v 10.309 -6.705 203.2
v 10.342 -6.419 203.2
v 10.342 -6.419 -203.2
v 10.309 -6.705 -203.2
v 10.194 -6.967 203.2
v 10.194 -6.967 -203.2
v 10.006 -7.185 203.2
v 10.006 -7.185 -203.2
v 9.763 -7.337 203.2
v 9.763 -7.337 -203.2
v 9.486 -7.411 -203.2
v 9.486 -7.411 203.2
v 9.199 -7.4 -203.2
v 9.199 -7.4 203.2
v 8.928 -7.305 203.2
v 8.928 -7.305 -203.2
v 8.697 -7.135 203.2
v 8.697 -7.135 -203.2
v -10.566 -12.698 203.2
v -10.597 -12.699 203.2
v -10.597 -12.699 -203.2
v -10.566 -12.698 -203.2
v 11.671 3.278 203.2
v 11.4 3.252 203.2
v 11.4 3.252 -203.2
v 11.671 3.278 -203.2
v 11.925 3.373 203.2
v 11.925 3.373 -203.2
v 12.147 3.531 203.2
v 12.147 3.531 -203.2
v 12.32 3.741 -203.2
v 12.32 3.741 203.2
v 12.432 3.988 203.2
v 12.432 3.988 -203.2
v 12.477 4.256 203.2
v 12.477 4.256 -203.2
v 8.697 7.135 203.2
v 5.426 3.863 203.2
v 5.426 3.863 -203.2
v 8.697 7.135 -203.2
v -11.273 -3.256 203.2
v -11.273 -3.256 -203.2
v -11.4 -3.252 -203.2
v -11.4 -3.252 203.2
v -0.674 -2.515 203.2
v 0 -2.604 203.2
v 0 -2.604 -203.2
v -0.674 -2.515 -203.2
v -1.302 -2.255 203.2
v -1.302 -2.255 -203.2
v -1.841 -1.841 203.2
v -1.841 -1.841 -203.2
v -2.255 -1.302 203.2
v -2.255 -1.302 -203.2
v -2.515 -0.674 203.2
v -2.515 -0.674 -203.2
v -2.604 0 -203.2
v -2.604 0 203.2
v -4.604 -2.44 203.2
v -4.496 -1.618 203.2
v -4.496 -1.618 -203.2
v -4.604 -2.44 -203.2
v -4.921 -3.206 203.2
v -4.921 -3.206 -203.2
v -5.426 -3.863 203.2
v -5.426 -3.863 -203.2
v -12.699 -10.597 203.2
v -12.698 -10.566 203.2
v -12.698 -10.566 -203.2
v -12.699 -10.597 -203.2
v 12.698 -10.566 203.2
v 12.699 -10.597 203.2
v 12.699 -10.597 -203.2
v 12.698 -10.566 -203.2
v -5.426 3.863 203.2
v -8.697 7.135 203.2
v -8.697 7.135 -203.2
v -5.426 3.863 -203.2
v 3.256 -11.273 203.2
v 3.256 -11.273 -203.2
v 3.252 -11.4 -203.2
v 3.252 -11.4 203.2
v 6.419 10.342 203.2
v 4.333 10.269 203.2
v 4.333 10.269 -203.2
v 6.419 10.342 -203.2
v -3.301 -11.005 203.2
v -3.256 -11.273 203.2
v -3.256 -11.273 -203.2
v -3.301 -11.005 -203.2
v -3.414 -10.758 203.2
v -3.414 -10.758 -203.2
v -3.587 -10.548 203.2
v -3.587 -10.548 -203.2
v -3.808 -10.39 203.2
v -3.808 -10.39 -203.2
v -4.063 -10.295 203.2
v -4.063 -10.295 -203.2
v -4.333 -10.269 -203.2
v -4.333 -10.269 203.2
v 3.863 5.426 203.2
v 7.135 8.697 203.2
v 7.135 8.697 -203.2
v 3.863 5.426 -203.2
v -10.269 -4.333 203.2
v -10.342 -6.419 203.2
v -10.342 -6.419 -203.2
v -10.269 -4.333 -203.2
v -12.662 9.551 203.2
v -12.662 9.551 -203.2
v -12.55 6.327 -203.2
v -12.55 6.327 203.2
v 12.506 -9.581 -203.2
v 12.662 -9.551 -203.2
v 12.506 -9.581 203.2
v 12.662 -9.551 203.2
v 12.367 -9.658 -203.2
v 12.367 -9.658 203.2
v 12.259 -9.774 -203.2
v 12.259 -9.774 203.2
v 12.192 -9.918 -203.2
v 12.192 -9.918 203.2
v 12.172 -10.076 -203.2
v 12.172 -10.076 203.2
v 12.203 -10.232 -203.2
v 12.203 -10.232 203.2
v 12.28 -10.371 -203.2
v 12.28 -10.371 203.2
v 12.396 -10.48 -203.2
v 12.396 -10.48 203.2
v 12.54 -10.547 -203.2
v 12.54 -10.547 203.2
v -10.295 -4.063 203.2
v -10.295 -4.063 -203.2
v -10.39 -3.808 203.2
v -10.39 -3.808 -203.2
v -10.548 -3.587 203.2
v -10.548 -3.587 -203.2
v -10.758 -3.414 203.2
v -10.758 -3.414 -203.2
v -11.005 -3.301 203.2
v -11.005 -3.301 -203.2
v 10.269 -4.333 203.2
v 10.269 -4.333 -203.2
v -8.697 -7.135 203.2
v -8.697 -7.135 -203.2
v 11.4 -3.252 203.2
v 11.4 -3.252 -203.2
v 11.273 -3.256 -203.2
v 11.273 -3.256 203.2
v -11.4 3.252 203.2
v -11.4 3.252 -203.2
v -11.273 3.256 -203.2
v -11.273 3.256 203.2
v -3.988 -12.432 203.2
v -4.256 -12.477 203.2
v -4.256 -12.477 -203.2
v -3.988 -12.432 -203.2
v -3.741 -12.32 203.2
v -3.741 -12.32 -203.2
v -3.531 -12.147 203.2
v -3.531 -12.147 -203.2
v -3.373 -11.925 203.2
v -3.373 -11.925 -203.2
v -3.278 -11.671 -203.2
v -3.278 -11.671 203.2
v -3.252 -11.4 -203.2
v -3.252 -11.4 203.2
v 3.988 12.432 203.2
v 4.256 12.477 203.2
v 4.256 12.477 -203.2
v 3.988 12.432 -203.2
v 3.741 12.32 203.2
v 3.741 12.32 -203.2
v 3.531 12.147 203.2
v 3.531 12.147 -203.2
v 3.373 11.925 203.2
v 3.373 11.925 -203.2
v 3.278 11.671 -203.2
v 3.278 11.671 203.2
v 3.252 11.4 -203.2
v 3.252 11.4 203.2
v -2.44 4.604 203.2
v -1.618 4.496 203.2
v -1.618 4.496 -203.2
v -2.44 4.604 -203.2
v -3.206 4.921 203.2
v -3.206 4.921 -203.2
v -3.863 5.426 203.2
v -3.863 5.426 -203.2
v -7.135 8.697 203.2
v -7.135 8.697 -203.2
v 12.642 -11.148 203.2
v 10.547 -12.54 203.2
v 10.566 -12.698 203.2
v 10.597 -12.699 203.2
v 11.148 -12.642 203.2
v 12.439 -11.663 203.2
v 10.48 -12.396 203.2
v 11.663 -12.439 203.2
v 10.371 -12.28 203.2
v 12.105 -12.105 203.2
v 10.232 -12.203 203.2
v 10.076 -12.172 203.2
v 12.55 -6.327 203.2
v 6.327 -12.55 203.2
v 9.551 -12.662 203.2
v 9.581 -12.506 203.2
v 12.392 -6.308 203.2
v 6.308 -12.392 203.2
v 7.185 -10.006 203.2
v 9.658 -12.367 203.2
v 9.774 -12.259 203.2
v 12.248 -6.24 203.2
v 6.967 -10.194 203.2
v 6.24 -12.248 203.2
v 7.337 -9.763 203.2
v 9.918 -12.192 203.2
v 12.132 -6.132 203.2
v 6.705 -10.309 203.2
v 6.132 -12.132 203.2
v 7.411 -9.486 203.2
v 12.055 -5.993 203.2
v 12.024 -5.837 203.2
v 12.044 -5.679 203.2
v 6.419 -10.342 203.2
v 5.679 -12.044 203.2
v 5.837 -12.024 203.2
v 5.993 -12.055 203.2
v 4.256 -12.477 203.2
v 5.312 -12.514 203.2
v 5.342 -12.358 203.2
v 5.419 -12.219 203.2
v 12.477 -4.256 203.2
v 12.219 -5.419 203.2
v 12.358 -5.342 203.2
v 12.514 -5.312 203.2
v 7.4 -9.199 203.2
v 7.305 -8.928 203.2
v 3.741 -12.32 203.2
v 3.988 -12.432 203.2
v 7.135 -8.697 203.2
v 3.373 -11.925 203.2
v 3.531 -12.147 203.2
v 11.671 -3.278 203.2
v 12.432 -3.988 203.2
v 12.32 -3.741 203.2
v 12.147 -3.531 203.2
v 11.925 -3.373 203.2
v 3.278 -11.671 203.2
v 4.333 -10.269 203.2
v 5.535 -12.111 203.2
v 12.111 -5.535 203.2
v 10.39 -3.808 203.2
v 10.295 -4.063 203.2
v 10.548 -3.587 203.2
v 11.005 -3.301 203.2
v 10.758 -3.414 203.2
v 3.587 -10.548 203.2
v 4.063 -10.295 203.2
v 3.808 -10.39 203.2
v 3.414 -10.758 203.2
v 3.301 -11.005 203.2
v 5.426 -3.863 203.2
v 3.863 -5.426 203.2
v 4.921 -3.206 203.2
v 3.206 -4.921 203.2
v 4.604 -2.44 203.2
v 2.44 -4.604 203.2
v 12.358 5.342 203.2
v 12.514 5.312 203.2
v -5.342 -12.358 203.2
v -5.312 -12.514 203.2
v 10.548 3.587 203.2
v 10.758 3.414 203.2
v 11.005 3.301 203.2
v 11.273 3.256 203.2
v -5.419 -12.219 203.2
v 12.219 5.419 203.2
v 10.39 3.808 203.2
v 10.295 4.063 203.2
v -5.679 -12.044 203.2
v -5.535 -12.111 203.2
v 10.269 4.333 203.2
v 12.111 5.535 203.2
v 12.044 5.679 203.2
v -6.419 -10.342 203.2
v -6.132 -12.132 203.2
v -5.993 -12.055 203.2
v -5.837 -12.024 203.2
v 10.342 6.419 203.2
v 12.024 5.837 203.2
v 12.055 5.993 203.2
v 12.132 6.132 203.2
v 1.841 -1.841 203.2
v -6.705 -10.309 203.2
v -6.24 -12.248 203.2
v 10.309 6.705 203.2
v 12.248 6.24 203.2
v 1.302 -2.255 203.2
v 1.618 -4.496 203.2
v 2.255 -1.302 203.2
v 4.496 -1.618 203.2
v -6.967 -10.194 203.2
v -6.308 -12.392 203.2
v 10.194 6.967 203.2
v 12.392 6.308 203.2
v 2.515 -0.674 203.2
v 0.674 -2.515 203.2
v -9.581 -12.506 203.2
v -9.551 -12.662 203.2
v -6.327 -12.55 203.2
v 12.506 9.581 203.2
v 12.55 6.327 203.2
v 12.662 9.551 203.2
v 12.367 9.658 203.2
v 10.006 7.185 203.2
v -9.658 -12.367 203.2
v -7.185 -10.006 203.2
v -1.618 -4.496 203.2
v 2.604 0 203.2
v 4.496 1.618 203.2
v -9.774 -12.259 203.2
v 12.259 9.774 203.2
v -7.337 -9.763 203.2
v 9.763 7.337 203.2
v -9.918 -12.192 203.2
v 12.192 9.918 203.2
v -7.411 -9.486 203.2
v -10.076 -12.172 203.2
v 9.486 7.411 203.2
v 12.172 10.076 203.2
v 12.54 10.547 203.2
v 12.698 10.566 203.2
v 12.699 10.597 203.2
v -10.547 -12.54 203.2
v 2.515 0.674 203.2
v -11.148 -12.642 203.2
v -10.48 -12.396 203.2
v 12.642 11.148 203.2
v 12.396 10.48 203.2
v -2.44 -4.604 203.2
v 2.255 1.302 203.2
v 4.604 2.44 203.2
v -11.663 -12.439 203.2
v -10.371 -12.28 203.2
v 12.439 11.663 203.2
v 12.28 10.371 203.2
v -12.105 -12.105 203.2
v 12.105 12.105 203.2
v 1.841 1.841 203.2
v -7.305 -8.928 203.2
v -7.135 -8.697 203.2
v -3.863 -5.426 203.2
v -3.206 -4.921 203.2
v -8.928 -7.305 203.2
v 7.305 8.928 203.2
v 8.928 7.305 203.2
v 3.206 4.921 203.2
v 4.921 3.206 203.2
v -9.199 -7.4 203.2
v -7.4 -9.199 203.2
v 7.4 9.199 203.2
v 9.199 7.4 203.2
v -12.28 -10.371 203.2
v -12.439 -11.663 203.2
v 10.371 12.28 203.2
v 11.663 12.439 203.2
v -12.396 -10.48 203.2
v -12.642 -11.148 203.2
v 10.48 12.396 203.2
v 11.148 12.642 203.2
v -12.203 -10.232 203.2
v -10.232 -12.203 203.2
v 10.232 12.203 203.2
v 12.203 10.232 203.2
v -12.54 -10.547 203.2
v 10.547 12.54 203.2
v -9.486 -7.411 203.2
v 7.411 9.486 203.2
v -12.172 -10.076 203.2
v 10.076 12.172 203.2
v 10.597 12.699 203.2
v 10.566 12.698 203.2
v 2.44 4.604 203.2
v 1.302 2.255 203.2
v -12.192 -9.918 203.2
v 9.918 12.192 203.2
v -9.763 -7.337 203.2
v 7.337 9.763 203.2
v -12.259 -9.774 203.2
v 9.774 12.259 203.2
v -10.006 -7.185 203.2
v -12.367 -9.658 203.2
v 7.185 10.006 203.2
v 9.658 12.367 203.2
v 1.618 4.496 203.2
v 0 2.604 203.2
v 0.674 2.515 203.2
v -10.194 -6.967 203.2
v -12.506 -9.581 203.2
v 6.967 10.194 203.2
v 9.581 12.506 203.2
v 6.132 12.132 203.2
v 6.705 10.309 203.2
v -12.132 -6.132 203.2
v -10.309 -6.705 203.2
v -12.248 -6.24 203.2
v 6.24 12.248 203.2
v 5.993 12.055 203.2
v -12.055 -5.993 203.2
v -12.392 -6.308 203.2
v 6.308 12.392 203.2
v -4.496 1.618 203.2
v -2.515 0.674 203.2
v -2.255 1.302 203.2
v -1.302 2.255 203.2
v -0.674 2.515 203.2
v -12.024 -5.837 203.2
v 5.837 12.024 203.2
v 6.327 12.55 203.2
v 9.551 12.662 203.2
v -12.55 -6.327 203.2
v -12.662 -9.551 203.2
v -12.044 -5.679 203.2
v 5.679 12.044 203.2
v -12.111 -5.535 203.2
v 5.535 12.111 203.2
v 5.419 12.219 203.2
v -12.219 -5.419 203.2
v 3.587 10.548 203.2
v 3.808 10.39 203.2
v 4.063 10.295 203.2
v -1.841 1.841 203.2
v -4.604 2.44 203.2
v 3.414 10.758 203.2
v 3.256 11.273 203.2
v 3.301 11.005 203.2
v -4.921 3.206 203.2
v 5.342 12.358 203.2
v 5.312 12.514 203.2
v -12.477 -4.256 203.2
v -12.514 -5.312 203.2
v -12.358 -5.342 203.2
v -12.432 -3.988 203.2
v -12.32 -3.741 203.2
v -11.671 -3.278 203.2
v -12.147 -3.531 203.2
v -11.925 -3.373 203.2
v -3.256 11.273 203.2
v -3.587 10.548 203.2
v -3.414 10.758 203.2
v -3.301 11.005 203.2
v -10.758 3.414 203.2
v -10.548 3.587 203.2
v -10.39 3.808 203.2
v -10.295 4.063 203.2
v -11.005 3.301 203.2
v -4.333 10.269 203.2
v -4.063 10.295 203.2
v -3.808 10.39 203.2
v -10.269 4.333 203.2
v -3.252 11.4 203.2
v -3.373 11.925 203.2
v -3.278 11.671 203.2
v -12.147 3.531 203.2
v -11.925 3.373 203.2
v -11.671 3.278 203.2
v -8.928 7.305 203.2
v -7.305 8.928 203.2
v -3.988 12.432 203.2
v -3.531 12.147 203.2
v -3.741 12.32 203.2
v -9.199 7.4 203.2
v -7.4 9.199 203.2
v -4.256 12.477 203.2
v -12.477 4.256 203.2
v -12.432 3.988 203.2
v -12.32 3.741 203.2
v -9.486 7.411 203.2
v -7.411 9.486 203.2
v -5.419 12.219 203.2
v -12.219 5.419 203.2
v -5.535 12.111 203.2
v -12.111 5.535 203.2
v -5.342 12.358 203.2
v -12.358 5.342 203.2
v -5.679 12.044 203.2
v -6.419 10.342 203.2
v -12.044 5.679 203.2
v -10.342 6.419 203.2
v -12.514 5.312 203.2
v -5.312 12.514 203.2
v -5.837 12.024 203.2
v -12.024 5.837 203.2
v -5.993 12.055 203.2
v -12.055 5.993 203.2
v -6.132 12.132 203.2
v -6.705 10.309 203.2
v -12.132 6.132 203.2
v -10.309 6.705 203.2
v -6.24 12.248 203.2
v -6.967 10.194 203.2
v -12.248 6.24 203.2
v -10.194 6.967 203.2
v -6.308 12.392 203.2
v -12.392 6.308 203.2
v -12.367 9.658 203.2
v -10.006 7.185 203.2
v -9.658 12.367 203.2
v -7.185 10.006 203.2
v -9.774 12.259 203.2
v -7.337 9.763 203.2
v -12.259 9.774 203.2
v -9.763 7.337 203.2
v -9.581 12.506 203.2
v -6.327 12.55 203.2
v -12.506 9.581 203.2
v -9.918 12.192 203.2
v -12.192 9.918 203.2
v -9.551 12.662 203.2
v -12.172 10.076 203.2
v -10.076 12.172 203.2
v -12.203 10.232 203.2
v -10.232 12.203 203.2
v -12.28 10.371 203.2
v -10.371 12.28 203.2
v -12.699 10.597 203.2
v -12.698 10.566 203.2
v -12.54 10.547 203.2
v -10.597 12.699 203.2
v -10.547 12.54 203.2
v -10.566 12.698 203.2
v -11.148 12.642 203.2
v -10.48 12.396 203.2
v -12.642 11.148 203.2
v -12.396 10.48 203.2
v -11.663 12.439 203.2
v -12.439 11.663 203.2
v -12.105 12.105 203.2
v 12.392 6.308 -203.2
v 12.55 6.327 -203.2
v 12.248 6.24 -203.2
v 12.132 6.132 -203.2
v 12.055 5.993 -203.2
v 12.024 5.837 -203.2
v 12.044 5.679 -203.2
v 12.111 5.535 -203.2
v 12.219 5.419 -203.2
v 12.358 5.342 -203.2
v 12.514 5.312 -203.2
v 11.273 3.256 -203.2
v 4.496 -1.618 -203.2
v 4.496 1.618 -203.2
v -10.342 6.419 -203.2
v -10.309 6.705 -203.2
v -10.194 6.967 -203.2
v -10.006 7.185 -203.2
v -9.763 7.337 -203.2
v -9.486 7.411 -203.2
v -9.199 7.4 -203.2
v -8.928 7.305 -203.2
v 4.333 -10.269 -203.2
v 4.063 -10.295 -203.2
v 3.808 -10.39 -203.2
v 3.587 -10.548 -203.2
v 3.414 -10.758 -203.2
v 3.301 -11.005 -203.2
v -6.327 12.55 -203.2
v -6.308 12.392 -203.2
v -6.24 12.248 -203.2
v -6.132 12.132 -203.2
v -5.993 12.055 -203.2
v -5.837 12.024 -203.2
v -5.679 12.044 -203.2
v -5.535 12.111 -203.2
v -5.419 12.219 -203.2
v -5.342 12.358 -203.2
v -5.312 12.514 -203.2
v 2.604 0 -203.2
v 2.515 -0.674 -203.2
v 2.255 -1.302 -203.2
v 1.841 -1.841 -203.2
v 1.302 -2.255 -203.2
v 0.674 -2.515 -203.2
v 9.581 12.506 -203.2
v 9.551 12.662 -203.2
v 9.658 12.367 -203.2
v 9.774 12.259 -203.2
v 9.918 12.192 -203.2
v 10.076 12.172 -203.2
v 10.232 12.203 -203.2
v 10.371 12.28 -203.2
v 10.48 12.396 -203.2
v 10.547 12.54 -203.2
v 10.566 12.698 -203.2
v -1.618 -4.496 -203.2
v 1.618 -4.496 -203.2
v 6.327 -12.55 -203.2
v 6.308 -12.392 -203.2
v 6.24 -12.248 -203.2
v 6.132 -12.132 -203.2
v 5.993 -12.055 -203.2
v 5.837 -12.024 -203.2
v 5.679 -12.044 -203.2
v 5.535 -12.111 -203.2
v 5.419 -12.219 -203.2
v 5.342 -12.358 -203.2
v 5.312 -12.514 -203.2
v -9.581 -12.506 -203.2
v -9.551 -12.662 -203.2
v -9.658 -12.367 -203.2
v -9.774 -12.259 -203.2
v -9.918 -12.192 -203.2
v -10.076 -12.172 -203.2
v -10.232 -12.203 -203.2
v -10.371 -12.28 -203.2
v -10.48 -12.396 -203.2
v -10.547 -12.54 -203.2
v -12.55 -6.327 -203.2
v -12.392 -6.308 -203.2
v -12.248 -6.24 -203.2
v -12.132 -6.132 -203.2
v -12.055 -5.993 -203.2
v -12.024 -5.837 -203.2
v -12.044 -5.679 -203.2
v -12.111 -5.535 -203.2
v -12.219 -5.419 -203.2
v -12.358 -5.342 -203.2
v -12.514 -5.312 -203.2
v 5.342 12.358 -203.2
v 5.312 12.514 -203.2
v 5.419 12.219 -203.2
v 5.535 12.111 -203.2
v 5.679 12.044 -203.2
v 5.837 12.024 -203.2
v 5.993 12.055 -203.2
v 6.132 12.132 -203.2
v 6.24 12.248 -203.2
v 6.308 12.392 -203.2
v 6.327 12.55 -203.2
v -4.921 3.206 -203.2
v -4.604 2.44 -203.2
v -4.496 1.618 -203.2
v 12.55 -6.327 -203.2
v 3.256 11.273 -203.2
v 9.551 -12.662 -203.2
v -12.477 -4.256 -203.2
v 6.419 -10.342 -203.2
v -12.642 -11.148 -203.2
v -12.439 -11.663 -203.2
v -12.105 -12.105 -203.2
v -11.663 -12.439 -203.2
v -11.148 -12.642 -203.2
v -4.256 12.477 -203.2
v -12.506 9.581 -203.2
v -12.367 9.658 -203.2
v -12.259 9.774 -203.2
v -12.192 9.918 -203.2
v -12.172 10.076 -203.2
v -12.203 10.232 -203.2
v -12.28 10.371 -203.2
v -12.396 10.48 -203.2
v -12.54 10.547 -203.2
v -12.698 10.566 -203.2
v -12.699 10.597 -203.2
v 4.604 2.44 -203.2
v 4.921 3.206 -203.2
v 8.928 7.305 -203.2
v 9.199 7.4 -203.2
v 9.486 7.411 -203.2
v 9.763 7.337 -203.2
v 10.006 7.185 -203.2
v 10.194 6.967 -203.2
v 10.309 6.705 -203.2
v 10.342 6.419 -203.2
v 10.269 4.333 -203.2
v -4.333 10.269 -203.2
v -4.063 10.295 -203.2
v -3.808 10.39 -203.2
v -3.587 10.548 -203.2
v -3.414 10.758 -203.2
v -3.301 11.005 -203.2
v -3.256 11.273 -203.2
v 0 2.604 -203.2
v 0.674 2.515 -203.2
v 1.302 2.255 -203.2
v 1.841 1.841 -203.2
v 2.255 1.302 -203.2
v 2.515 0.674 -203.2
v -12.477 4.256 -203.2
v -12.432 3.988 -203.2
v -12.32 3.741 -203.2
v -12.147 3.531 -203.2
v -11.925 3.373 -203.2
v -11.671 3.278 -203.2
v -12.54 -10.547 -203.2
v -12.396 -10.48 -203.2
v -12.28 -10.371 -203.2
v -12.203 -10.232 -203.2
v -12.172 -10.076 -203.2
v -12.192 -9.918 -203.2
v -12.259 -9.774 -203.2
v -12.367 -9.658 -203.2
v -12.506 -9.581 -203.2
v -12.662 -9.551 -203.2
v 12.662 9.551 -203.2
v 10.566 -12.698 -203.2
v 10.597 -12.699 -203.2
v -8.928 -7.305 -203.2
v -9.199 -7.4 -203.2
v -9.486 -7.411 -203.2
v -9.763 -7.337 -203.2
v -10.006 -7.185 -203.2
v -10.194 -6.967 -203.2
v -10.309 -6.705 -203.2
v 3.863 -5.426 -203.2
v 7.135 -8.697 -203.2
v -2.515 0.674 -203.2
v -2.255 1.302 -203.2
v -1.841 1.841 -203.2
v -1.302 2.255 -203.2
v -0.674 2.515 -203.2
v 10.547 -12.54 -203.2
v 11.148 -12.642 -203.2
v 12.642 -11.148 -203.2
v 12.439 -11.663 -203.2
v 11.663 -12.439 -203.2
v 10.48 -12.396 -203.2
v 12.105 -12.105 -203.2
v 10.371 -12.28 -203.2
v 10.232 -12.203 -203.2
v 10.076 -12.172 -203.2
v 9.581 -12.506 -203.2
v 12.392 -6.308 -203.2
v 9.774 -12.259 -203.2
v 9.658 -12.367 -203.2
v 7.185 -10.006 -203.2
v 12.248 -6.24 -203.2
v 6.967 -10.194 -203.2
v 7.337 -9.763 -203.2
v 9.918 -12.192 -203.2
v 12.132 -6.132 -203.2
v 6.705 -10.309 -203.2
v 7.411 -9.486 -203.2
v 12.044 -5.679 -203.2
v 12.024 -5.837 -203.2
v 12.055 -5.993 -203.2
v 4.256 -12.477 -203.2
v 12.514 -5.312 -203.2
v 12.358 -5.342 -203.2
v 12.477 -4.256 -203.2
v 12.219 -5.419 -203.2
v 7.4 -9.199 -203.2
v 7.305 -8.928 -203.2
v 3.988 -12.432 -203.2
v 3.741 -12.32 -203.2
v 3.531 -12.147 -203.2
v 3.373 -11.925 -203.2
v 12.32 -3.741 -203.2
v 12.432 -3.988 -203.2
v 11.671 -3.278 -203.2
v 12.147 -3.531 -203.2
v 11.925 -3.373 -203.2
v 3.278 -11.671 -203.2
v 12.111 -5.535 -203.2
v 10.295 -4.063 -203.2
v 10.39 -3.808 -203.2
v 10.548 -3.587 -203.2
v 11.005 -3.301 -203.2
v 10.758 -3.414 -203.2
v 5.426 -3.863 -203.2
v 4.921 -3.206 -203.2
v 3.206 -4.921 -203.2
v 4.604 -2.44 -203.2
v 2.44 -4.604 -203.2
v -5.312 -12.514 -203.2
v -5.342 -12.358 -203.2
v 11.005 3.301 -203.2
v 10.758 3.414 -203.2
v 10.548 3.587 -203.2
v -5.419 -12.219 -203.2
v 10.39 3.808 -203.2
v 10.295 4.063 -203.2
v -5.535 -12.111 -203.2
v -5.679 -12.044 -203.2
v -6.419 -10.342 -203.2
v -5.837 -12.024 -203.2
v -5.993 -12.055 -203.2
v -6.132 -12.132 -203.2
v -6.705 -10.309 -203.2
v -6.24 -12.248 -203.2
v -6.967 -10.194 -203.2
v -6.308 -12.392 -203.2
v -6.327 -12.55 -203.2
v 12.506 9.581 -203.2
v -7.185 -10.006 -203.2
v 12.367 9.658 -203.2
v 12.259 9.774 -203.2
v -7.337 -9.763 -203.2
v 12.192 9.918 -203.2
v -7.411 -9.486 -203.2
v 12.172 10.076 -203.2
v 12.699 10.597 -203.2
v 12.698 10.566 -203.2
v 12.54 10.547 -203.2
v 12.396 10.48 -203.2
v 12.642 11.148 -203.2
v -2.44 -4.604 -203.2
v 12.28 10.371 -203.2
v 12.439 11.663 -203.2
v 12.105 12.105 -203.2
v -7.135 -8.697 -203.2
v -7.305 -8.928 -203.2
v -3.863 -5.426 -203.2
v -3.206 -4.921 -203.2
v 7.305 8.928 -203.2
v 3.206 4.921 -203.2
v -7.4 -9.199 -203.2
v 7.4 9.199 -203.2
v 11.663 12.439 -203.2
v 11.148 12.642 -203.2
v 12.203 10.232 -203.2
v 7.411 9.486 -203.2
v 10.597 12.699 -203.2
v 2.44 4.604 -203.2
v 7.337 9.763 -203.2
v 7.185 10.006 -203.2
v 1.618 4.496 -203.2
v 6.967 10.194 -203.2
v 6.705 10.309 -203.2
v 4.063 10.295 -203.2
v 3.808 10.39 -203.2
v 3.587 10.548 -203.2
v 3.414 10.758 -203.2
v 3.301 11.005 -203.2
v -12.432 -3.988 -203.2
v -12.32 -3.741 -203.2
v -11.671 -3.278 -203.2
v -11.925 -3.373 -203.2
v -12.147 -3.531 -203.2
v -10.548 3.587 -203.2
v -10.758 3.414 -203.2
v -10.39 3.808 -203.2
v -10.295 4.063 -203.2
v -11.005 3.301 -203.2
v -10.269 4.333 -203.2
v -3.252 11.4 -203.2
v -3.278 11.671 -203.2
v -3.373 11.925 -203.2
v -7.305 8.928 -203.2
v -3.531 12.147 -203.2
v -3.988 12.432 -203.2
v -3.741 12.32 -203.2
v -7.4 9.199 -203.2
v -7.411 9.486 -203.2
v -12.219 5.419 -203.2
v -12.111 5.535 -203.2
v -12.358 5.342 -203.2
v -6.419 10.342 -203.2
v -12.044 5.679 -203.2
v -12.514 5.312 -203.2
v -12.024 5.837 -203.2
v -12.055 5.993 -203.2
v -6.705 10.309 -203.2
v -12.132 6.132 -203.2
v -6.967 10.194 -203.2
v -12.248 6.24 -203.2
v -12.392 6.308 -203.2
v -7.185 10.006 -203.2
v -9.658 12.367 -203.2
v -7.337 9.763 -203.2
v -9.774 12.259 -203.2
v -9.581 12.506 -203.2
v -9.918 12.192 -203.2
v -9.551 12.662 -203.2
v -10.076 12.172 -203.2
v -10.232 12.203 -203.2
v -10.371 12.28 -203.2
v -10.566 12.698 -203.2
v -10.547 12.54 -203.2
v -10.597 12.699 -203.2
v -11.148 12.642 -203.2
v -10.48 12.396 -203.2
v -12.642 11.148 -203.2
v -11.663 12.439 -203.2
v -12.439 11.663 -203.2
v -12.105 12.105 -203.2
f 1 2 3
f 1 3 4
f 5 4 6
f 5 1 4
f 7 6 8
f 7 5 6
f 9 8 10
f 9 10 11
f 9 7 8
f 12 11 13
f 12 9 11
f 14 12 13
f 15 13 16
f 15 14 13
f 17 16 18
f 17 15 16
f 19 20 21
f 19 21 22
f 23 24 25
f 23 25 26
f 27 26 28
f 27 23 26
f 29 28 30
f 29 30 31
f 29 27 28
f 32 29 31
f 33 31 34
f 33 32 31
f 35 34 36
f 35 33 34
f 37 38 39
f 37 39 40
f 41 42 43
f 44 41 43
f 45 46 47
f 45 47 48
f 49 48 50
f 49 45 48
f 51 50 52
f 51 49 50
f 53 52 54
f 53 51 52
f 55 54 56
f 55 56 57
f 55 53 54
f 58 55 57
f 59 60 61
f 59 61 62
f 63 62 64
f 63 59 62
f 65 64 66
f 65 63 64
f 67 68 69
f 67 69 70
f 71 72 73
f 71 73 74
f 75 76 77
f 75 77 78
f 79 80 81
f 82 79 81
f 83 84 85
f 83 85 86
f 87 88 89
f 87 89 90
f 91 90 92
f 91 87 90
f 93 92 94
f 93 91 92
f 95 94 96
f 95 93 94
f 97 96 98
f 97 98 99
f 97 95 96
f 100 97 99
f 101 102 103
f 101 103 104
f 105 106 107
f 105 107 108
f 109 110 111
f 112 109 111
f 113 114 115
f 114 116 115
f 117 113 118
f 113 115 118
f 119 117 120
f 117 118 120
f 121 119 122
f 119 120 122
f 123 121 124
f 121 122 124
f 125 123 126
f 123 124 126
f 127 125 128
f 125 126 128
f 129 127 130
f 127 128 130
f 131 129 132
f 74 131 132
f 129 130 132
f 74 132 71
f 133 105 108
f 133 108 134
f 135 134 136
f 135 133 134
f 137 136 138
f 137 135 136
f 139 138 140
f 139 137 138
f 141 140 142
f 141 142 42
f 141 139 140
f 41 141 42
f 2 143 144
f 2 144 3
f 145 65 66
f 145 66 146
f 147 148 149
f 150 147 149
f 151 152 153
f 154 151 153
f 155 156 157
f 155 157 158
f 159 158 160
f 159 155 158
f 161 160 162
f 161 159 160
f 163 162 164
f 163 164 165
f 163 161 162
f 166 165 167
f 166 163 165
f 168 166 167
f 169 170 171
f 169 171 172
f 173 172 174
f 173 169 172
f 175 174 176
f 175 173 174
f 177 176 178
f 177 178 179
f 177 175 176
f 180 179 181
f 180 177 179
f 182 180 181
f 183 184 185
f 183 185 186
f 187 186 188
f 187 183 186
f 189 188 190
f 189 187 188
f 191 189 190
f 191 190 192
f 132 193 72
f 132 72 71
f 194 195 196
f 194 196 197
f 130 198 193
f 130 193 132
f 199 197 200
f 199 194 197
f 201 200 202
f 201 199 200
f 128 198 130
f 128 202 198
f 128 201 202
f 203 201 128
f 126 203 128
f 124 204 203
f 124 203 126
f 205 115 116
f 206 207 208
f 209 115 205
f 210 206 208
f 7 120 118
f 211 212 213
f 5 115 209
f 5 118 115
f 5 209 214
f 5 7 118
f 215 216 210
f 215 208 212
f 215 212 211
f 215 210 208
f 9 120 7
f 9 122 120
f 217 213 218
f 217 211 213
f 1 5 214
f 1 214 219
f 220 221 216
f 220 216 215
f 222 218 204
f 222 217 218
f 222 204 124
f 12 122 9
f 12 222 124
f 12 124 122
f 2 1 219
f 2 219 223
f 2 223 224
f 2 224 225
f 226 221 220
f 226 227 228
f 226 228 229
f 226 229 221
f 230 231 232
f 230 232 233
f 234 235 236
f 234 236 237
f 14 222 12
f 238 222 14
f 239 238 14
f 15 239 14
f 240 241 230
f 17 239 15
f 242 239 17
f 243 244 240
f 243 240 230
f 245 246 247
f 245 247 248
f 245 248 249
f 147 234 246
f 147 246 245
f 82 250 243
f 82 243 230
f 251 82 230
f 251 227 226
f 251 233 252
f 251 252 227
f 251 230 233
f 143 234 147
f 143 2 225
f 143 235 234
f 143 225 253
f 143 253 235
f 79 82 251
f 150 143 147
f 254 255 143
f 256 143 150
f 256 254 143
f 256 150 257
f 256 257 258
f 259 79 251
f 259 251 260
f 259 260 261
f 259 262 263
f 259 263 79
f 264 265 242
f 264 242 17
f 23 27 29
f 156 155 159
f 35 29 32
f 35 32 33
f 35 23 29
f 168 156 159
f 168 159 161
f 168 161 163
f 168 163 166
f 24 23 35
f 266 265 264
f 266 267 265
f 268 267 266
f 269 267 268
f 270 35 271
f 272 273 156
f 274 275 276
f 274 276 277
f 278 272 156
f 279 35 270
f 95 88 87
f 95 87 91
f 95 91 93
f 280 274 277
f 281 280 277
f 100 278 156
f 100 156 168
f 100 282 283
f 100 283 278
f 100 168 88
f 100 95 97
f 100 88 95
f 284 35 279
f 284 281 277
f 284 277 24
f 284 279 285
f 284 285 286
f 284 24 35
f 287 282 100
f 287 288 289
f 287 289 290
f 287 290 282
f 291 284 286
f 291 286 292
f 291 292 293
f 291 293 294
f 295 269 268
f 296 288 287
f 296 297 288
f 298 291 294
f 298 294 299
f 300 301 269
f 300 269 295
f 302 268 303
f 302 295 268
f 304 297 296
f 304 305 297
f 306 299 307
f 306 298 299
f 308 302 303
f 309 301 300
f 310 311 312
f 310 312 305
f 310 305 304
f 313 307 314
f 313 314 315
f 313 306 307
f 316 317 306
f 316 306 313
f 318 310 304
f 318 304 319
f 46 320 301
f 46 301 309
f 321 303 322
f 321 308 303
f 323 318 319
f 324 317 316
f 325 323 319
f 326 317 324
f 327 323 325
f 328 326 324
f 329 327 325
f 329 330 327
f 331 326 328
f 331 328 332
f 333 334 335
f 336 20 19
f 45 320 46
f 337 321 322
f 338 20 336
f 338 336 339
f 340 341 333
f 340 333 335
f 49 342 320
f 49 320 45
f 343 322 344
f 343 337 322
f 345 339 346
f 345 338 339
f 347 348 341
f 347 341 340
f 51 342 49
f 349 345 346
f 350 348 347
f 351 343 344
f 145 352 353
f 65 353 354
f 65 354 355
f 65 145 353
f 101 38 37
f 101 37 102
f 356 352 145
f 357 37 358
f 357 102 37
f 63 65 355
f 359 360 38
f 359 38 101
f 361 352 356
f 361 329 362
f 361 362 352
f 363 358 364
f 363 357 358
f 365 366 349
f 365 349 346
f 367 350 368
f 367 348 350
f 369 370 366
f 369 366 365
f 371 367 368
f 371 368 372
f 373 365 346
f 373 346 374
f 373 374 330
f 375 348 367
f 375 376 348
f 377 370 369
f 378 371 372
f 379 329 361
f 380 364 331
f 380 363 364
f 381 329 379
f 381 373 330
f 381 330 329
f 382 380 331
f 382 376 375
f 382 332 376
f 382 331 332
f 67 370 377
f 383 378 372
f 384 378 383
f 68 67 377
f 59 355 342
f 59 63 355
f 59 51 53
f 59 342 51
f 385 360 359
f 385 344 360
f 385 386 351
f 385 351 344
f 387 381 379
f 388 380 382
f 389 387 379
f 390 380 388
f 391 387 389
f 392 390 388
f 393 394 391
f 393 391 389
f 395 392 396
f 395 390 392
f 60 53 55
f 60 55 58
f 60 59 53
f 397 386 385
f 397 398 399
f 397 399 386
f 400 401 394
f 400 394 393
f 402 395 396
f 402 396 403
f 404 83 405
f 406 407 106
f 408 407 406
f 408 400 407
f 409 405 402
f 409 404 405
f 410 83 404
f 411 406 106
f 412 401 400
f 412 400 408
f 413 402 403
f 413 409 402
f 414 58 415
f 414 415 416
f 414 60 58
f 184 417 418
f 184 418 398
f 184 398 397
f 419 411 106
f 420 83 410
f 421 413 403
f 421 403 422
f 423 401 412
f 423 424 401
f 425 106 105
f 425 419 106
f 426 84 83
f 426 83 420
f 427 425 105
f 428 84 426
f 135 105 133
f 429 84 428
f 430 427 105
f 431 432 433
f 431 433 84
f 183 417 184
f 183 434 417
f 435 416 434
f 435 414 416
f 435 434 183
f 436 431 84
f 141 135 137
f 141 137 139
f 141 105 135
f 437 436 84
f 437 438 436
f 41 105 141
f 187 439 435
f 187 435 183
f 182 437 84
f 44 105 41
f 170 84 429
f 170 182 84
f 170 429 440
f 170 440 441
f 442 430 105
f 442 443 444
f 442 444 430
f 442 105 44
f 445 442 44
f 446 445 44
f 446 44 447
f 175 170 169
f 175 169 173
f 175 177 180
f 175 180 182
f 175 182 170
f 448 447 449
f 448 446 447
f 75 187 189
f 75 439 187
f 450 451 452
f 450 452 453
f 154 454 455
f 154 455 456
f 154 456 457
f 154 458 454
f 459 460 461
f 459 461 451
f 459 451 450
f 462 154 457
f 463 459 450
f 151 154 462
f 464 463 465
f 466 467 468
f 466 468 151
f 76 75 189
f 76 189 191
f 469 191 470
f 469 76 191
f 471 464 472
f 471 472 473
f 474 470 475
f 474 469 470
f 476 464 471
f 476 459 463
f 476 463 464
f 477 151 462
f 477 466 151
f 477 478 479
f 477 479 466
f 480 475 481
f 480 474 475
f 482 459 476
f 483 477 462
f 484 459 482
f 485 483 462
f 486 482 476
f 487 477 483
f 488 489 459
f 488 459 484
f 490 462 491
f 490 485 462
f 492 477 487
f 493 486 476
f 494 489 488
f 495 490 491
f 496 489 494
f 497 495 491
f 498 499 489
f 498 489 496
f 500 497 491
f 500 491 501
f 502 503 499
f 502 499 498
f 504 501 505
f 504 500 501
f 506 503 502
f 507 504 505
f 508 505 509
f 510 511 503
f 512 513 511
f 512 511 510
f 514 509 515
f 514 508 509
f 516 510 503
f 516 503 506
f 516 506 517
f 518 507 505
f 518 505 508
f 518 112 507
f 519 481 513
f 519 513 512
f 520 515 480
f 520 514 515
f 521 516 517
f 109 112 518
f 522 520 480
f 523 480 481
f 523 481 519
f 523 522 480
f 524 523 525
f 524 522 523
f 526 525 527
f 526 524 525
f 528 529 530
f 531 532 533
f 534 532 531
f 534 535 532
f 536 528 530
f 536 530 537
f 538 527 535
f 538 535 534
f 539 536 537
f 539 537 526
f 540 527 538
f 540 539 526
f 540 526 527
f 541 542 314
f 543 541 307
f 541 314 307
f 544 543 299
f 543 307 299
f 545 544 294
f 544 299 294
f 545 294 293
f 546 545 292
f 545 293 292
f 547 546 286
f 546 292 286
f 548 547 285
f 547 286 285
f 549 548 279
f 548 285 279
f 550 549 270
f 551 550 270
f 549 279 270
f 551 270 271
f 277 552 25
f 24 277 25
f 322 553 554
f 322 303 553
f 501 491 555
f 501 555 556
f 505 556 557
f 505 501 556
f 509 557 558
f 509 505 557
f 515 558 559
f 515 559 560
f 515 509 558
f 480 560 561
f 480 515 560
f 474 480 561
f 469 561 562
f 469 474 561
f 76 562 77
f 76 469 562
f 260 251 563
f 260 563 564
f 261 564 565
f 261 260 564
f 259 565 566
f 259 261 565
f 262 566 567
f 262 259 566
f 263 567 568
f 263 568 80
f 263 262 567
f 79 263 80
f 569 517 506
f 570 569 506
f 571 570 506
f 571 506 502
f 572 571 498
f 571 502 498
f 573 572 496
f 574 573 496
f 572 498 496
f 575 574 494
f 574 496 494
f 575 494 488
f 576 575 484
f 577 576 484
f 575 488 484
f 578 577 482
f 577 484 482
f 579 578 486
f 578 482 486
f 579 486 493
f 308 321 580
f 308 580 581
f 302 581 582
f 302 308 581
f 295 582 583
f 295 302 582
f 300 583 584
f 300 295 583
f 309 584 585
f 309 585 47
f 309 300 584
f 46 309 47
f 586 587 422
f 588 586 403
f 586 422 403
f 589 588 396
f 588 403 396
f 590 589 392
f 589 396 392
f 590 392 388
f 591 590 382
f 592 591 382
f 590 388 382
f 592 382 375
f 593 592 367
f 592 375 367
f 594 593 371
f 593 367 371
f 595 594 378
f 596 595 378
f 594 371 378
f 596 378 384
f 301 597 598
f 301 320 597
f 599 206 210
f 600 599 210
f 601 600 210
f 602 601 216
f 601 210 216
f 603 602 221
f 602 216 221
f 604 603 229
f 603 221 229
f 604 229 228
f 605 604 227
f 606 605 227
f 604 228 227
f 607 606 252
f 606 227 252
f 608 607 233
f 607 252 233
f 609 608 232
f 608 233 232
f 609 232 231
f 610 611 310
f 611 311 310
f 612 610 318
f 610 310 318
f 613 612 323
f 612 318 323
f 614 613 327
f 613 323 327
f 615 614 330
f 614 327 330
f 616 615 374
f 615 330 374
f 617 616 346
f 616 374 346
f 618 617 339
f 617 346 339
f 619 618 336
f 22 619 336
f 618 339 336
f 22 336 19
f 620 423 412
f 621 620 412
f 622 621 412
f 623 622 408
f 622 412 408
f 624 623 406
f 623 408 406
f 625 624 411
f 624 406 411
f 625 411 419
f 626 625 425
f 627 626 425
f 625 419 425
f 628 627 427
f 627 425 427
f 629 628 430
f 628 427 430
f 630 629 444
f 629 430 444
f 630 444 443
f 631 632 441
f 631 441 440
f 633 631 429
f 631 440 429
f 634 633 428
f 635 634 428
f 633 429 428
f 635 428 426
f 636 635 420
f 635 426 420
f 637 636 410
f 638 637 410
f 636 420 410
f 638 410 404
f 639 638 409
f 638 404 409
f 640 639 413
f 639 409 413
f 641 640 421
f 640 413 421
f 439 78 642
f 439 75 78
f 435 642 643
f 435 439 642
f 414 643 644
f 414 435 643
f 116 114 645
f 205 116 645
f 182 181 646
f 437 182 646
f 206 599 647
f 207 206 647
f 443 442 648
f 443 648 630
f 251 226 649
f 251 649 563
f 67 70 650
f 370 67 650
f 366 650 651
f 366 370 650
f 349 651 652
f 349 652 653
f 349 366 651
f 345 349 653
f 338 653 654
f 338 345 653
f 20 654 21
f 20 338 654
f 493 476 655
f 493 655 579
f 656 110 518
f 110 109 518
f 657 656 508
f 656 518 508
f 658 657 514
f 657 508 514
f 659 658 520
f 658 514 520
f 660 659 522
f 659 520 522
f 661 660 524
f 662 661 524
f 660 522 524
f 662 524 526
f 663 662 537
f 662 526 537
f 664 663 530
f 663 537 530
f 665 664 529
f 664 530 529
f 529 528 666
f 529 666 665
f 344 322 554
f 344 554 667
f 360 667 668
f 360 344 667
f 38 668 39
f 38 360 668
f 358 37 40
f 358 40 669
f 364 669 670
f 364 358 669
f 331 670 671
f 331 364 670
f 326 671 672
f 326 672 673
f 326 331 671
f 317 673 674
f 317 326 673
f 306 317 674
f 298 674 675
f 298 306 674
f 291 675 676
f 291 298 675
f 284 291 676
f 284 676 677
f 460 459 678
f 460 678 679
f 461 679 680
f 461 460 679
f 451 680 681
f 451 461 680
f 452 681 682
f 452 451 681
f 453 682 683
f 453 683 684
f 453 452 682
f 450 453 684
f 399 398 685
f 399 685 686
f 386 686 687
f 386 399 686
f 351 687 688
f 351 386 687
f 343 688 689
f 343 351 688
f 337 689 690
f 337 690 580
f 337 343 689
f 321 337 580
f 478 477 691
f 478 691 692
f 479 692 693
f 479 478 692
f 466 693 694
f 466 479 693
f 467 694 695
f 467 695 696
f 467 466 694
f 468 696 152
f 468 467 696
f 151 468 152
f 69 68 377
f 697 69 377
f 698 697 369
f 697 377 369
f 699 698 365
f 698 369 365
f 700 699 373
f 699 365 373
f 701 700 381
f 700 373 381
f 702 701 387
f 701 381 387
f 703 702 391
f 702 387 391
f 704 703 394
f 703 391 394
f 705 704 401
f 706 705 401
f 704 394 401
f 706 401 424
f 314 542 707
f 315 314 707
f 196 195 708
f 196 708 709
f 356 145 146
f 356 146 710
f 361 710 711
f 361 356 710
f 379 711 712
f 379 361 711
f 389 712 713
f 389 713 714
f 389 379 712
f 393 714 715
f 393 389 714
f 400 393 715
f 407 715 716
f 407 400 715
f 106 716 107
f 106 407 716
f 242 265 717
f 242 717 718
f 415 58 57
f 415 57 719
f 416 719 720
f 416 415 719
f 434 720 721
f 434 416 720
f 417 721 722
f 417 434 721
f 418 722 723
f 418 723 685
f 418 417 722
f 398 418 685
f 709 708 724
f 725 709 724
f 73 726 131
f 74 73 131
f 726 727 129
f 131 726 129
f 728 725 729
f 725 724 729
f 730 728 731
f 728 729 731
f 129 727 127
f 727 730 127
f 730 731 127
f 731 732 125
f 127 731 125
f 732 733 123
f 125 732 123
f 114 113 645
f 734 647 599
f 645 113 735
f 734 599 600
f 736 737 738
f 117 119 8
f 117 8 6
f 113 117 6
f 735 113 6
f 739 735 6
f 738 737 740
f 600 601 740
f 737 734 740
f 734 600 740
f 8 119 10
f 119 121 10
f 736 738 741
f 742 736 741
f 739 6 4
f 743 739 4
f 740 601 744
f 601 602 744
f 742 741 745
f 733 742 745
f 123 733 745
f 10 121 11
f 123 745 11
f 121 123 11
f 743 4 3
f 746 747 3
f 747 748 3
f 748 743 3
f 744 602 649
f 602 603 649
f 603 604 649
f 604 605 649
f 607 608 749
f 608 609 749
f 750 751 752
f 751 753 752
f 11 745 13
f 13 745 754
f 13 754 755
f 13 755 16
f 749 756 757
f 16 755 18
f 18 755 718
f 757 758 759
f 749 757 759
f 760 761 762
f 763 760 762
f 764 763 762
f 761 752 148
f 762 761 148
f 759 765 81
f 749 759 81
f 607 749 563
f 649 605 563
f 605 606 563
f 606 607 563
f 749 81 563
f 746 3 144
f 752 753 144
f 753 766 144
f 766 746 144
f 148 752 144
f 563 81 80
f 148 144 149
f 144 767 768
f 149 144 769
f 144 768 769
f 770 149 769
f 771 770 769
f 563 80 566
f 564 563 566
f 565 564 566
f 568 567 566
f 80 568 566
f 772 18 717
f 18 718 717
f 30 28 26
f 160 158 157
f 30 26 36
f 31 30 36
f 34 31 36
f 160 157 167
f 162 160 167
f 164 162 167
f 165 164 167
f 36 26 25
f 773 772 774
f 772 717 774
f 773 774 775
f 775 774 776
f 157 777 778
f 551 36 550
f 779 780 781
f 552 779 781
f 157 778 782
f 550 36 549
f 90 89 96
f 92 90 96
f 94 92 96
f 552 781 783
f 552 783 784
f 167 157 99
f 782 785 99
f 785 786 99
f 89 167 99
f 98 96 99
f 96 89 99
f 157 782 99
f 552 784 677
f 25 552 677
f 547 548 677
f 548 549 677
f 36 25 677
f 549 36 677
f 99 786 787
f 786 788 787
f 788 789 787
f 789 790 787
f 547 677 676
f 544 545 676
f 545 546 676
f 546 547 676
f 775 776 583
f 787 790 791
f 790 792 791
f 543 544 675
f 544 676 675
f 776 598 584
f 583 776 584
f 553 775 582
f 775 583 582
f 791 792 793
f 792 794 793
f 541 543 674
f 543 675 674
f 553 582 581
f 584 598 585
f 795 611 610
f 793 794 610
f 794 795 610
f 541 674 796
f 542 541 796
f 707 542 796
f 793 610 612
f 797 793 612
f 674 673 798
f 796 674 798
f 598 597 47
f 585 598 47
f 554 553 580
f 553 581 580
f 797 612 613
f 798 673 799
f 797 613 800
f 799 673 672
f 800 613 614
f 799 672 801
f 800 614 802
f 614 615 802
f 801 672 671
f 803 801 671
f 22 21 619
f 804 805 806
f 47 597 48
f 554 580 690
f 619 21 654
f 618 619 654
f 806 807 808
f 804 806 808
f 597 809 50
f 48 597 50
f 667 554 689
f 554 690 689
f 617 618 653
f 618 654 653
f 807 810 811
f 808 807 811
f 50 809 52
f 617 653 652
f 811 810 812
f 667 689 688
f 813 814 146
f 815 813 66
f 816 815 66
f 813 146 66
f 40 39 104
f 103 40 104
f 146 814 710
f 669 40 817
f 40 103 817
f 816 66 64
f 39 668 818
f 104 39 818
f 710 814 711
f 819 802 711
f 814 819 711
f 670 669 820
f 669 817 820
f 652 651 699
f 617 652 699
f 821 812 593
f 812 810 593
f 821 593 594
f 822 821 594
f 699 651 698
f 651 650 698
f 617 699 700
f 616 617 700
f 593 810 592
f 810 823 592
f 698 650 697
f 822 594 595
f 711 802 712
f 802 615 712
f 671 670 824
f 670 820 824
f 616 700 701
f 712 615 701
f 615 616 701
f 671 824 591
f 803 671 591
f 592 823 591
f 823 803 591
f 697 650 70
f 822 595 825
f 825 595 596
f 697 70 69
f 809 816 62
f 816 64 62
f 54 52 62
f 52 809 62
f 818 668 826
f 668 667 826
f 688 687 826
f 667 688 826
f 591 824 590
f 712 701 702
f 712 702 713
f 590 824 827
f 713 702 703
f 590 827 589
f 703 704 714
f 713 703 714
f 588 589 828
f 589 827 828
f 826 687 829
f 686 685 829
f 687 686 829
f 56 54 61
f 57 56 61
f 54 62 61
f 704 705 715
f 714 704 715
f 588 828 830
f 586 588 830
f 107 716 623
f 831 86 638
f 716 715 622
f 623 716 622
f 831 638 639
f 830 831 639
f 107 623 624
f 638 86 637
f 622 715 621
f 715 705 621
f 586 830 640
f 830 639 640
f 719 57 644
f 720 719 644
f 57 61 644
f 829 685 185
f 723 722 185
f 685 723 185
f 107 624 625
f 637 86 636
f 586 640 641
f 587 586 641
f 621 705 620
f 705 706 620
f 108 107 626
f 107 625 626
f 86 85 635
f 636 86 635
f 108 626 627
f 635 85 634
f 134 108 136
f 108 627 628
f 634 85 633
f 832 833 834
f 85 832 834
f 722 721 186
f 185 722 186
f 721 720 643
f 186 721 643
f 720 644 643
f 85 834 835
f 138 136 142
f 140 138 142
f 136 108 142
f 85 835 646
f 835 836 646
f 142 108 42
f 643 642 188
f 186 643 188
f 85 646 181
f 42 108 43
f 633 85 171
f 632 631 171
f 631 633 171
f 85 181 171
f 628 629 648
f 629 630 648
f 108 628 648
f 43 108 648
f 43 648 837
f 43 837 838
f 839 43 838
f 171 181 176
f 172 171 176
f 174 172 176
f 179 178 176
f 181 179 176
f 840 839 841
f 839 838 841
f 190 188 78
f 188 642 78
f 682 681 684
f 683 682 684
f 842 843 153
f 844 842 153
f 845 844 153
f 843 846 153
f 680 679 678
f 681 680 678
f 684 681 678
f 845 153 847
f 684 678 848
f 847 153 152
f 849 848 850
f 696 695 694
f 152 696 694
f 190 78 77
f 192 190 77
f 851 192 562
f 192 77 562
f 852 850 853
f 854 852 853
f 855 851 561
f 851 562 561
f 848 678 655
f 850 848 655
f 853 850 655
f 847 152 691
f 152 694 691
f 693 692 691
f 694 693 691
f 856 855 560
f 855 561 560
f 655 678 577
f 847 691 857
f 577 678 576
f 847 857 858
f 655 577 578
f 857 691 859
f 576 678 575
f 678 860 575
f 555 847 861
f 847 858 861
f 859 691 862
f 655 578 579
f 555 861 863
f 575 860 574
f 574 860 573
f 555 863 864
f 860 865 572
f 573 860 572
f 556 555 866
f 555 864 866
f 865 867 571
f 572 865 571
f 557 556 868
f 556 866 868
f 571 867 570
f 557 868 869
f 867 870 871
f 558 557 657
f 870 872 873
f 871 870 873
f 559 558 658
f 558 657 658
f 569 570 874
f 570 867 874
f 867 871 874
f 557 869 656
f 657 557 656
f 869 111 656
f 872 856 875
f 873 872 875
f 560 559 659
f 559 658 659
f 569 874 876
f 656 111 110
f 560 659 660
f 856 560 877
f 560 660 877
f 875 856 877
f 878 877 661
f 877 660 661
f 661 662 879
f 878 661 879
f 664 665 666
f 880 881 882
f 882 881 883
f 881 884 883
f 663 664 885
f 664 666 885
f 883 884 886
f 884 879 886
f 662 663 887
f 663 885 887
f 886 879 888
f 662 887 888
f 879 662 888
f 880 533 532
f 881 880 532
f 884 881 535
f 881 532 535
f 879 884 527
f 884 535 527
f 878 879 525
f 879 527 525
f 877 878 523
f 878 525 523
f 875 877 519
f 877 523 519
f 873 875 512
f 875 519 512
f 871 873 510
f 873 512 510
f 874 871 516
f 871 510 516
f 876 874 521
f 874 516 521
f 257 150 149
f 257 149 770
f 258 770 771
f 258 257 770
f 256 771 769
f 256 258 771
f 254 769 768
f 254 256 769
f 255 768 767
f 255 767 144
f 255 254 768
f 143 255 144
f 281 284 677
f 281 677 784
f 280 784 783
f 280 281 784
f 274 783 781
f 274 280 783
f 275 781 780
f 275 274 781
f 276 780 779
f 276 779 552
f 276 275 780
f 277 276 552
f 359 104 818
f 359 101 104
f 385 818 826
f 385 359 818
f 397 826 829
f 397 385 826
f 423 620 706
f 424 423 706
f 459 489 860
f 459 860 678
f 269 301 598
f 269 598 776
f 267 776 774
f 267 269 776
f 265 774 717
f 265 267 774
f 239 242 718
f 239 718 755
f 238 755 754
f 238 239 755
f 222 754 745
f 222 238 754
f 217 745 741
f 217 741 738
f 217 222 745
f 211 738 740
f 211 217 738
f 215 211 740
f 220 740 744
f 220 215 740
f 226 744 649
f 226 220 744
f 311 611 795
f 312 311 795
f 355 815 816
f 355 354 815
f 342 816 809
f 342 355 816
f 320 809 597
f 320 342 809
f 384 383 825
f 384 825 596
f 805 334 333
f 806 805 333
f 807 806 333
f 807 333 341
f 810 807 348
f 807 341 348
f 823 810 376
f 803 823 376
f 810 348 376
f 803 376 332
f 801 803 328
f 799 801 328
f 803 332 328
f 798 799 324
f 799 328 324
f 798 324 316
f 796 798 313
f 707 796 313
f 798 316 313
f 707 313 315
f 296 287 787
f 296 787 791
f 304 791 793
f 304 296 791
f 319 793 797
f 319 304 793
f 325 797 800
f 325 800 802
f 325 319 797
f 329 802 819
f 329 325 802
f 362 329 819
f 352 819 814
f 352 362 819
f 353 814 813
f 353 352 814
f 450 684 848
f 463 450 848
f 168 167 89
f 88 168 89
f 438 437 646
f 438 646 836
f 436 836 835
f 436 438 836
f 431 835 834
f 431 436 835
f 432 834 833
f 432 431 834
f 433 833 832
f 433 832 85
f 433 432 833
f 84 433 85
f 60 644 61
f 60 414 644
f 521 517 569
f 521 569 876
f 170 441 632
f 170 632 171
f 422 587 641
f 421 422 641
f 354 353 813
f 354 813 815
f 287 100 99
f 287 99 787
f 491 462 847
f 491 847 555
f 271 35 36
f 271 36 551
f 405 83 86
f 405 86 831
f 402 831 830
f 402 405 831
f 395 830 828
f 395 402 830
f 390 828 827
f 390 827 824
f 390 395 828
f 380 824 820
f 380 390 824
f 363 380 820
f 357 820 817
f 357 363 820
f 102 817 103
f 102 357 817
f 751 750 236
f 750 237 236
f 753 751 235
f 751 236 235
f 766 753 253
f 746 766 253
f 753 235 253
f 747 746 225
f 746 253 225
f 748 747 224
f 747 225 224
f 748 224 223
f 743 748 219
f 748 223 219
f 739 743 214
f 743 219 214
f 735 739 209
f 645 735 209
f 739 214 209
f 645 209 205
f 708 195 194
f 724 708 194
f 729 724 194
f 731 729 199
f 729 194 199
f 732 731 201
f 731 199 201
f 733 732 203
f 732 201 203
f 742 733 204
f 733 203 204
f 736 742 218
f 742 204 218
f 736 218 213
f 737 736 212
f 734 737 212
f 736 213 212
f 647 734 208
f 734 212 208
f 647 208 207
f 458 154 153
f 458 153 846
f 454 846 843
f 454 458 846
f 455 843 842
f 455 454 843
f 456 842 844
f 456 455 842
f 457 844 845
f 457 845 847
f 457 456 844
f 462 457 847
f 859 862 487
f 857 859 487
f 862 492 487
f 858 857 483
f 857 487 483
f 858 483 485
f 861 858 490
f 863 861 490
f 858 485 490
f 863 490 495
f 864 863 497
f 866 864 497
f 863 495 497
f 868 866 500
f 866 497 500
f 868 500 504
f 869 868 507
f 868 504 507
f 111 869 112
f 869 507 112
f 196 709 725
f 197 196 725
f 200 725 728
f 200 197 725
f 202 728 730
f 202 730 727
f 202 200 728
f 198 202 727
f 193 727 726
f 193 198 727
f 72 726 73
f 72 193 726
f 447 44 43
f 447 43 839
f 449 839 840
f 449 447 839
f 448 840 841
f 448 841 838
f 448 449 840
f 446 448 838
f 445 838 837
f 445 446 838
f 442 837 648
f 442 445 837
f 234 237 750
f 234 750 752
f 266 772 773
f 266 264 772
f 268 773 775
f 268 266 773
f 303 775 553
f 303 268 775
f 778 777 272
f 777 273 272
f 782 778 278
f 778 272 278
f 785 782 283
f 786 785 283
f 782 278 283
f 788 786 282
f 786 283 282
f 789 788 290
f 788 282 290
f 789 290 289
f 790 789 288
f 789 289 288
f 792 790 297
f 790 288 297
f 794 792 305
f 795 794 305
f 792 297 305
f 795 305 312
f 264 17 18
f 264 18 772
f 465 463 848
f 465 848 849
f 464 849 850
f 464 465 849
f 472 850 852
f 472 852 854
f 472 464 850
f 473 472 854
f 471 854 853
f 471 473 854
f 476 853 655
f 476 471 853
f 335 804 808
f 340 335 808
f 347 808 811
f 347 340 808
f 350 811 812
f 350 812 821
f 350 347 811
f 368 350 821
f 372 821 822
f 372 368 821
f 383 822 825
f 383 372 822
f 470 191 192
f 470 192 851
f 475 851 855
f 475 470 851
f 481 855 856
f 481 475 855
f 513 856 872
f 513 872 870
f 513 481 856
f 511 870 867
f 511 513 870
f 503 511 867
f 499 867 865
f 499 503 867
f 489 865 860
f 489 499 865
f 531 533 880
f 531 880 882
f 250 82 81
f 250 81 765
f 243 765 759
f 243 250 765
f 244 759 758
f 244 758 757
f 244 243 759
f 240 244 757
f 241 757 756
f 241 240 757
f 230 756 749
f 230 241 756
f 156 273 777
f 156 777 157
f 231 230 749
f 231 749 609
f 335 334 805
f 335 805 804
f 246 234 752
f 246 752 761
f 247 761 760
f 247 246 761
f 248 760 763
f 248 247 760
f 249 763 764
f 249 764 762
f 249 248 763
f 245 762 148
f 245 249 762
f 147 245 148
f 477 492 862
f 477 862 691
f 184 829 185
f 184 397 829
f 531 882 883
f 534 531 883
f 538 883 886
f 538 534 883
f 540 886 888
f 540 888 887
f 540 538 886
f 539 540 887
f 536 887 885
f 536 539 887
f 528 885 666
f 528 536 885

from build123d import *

# Parameters (mm, degrees)
BOSS_EXTRUDE1_DEPTH = 203.2
SKETCH4_R           = 0.508
CUT_EXTRUDE1_DEPTH  = 204.992205733
CIRPATTERN1_COUNT   = 4


with BuildPart() as part:
    # Sketch3 → Boss-Extrude1 (new, symmetric)
    with BuildSketch(Plane.XY):
        with BuildLine():
            Line((-4.4958, 0), (-2.6035, 0))
            ThreePointArc((-2.6035, 0), (-2.405320363, 0.996316316), (-1.840952505, 1.840952505))
            ThreePointArc((-1.840952505, 1.840952505), (-0.996316316, 2.405320363), (0, 2.6035))
            Line((0, 2.6035), (0, 4.4958))
            Line((0, 4.4958), (-1.618107374, 4.4958))
            ThreePointArc((-1.618107374, 4.4958), (-2.833127272, 4.737482484), (-3.863171405, 5.42573597))
            Line((-3.863171405, 5.42573597), (-7.134523758, 8.697088323))
            ThreePointArc((-7.134523758, 8.697088323), (-7.336866533, 9.762858418), (-6.419414188, 10.341727737))
            Line((-6.419414188, 10.341727737), (-4.333376572, 10.268881698))
            ThreePointArc((-4.333376572, 10.268881698), (-3.586799144, 10.548015561), (-3.256266629, 11.27330297))
            Line((-3.256266629, 11.27330297), (-3.251834393, 11.400225605))
            ThreePointArc((-3.251834393, 11.400225605), (-3.530968255, 12.146803033), (-4.256255664, 12.477335548))
            Line((-4.256255664, 12.477335548), (-10.597084223, 12.698762161))
            ThreePointArc((-10.597084223, 12.698762161), (-12.104840979, 12.104840979), (-12.698762161, 10.597084223))
            Line((-12.698762161, 10.597084223), (-12.477335548, 4.256255664))
            ThreePointArc((-12.477335548, 4.256255664), (-12.146803033, 3.530968255), (-11.400225605, 3.251834393))
            Line((-11.400225605, 3.251834393), (-11.27330297, 3.256266629))
            ThreePointArc((-11.27330297, 3.256266629), (-10.548015561, 3.586799144), (-10.268881698, 4.333376572))
            Line((-10.268881698, 4.333376572), (-10.341727737, 6.419414188))
            ThreePointArc((-10.341727737, 6.419414188), (-9.762858418, 7.336866533), (-8.697088323, 7.134523758))
            Line((-8.697088323, 7.134523758), (-5.42573597, 3.863171405))
            ThreePointArc((-5.42573597, 3.863171405), (-4.737482484, 2.833127272), (-4.4958, 1.618107374))
            Line((-4.4958, 1.618107374), (-4.4958, 0))
        make_face()
    boss_extrude1 = extrude(amount=BOSS_EXTRUDE1_DEPTH, both=True)

    # Sketch4 → Cut-Extrude1 (cut, symmetric)
    with BuildSketch(Plane.XY):
        with Locations((-5.819260055, 12.531916864)):
            Circle(SKETCH4_R)
        with Locations((-10.058476065, 12.679953549)):
            Circle(SKETCH4_R)
        with Locations((-12.679953549, 10.058476065)):
            Circle(SKETCH4_R)
        with Locations((-12.531916864, 5.819260055)):
            Circle(SKETCH4_R)
    cut_extrude1 = extrude(amount=CUT_EXTRUDE1_DEPTH, both=True, mode=Mode.SUBTRACT)

    # CirPattern1: Boss-Extrude1, Cut-Extrude1 ×4 about axis
    cirpattern1_axis = Axis((0, 0, 0), (0, 0, 1))
    add([boss_extrude1.rotate(cirpattern1_axis, i * 360 / CIRPATTERN1_COUNT) for i in range(1, CIRPATTERN1_COUNT)])
    add([cut_extrude1.rotate(cirpattern1_axis, i * 360 / CIRPATTERN1_COUNT) for i in range(1, CIRPATTERN1_COUNT)], mode=Mode.SUBTRACT)


solid = part.part
